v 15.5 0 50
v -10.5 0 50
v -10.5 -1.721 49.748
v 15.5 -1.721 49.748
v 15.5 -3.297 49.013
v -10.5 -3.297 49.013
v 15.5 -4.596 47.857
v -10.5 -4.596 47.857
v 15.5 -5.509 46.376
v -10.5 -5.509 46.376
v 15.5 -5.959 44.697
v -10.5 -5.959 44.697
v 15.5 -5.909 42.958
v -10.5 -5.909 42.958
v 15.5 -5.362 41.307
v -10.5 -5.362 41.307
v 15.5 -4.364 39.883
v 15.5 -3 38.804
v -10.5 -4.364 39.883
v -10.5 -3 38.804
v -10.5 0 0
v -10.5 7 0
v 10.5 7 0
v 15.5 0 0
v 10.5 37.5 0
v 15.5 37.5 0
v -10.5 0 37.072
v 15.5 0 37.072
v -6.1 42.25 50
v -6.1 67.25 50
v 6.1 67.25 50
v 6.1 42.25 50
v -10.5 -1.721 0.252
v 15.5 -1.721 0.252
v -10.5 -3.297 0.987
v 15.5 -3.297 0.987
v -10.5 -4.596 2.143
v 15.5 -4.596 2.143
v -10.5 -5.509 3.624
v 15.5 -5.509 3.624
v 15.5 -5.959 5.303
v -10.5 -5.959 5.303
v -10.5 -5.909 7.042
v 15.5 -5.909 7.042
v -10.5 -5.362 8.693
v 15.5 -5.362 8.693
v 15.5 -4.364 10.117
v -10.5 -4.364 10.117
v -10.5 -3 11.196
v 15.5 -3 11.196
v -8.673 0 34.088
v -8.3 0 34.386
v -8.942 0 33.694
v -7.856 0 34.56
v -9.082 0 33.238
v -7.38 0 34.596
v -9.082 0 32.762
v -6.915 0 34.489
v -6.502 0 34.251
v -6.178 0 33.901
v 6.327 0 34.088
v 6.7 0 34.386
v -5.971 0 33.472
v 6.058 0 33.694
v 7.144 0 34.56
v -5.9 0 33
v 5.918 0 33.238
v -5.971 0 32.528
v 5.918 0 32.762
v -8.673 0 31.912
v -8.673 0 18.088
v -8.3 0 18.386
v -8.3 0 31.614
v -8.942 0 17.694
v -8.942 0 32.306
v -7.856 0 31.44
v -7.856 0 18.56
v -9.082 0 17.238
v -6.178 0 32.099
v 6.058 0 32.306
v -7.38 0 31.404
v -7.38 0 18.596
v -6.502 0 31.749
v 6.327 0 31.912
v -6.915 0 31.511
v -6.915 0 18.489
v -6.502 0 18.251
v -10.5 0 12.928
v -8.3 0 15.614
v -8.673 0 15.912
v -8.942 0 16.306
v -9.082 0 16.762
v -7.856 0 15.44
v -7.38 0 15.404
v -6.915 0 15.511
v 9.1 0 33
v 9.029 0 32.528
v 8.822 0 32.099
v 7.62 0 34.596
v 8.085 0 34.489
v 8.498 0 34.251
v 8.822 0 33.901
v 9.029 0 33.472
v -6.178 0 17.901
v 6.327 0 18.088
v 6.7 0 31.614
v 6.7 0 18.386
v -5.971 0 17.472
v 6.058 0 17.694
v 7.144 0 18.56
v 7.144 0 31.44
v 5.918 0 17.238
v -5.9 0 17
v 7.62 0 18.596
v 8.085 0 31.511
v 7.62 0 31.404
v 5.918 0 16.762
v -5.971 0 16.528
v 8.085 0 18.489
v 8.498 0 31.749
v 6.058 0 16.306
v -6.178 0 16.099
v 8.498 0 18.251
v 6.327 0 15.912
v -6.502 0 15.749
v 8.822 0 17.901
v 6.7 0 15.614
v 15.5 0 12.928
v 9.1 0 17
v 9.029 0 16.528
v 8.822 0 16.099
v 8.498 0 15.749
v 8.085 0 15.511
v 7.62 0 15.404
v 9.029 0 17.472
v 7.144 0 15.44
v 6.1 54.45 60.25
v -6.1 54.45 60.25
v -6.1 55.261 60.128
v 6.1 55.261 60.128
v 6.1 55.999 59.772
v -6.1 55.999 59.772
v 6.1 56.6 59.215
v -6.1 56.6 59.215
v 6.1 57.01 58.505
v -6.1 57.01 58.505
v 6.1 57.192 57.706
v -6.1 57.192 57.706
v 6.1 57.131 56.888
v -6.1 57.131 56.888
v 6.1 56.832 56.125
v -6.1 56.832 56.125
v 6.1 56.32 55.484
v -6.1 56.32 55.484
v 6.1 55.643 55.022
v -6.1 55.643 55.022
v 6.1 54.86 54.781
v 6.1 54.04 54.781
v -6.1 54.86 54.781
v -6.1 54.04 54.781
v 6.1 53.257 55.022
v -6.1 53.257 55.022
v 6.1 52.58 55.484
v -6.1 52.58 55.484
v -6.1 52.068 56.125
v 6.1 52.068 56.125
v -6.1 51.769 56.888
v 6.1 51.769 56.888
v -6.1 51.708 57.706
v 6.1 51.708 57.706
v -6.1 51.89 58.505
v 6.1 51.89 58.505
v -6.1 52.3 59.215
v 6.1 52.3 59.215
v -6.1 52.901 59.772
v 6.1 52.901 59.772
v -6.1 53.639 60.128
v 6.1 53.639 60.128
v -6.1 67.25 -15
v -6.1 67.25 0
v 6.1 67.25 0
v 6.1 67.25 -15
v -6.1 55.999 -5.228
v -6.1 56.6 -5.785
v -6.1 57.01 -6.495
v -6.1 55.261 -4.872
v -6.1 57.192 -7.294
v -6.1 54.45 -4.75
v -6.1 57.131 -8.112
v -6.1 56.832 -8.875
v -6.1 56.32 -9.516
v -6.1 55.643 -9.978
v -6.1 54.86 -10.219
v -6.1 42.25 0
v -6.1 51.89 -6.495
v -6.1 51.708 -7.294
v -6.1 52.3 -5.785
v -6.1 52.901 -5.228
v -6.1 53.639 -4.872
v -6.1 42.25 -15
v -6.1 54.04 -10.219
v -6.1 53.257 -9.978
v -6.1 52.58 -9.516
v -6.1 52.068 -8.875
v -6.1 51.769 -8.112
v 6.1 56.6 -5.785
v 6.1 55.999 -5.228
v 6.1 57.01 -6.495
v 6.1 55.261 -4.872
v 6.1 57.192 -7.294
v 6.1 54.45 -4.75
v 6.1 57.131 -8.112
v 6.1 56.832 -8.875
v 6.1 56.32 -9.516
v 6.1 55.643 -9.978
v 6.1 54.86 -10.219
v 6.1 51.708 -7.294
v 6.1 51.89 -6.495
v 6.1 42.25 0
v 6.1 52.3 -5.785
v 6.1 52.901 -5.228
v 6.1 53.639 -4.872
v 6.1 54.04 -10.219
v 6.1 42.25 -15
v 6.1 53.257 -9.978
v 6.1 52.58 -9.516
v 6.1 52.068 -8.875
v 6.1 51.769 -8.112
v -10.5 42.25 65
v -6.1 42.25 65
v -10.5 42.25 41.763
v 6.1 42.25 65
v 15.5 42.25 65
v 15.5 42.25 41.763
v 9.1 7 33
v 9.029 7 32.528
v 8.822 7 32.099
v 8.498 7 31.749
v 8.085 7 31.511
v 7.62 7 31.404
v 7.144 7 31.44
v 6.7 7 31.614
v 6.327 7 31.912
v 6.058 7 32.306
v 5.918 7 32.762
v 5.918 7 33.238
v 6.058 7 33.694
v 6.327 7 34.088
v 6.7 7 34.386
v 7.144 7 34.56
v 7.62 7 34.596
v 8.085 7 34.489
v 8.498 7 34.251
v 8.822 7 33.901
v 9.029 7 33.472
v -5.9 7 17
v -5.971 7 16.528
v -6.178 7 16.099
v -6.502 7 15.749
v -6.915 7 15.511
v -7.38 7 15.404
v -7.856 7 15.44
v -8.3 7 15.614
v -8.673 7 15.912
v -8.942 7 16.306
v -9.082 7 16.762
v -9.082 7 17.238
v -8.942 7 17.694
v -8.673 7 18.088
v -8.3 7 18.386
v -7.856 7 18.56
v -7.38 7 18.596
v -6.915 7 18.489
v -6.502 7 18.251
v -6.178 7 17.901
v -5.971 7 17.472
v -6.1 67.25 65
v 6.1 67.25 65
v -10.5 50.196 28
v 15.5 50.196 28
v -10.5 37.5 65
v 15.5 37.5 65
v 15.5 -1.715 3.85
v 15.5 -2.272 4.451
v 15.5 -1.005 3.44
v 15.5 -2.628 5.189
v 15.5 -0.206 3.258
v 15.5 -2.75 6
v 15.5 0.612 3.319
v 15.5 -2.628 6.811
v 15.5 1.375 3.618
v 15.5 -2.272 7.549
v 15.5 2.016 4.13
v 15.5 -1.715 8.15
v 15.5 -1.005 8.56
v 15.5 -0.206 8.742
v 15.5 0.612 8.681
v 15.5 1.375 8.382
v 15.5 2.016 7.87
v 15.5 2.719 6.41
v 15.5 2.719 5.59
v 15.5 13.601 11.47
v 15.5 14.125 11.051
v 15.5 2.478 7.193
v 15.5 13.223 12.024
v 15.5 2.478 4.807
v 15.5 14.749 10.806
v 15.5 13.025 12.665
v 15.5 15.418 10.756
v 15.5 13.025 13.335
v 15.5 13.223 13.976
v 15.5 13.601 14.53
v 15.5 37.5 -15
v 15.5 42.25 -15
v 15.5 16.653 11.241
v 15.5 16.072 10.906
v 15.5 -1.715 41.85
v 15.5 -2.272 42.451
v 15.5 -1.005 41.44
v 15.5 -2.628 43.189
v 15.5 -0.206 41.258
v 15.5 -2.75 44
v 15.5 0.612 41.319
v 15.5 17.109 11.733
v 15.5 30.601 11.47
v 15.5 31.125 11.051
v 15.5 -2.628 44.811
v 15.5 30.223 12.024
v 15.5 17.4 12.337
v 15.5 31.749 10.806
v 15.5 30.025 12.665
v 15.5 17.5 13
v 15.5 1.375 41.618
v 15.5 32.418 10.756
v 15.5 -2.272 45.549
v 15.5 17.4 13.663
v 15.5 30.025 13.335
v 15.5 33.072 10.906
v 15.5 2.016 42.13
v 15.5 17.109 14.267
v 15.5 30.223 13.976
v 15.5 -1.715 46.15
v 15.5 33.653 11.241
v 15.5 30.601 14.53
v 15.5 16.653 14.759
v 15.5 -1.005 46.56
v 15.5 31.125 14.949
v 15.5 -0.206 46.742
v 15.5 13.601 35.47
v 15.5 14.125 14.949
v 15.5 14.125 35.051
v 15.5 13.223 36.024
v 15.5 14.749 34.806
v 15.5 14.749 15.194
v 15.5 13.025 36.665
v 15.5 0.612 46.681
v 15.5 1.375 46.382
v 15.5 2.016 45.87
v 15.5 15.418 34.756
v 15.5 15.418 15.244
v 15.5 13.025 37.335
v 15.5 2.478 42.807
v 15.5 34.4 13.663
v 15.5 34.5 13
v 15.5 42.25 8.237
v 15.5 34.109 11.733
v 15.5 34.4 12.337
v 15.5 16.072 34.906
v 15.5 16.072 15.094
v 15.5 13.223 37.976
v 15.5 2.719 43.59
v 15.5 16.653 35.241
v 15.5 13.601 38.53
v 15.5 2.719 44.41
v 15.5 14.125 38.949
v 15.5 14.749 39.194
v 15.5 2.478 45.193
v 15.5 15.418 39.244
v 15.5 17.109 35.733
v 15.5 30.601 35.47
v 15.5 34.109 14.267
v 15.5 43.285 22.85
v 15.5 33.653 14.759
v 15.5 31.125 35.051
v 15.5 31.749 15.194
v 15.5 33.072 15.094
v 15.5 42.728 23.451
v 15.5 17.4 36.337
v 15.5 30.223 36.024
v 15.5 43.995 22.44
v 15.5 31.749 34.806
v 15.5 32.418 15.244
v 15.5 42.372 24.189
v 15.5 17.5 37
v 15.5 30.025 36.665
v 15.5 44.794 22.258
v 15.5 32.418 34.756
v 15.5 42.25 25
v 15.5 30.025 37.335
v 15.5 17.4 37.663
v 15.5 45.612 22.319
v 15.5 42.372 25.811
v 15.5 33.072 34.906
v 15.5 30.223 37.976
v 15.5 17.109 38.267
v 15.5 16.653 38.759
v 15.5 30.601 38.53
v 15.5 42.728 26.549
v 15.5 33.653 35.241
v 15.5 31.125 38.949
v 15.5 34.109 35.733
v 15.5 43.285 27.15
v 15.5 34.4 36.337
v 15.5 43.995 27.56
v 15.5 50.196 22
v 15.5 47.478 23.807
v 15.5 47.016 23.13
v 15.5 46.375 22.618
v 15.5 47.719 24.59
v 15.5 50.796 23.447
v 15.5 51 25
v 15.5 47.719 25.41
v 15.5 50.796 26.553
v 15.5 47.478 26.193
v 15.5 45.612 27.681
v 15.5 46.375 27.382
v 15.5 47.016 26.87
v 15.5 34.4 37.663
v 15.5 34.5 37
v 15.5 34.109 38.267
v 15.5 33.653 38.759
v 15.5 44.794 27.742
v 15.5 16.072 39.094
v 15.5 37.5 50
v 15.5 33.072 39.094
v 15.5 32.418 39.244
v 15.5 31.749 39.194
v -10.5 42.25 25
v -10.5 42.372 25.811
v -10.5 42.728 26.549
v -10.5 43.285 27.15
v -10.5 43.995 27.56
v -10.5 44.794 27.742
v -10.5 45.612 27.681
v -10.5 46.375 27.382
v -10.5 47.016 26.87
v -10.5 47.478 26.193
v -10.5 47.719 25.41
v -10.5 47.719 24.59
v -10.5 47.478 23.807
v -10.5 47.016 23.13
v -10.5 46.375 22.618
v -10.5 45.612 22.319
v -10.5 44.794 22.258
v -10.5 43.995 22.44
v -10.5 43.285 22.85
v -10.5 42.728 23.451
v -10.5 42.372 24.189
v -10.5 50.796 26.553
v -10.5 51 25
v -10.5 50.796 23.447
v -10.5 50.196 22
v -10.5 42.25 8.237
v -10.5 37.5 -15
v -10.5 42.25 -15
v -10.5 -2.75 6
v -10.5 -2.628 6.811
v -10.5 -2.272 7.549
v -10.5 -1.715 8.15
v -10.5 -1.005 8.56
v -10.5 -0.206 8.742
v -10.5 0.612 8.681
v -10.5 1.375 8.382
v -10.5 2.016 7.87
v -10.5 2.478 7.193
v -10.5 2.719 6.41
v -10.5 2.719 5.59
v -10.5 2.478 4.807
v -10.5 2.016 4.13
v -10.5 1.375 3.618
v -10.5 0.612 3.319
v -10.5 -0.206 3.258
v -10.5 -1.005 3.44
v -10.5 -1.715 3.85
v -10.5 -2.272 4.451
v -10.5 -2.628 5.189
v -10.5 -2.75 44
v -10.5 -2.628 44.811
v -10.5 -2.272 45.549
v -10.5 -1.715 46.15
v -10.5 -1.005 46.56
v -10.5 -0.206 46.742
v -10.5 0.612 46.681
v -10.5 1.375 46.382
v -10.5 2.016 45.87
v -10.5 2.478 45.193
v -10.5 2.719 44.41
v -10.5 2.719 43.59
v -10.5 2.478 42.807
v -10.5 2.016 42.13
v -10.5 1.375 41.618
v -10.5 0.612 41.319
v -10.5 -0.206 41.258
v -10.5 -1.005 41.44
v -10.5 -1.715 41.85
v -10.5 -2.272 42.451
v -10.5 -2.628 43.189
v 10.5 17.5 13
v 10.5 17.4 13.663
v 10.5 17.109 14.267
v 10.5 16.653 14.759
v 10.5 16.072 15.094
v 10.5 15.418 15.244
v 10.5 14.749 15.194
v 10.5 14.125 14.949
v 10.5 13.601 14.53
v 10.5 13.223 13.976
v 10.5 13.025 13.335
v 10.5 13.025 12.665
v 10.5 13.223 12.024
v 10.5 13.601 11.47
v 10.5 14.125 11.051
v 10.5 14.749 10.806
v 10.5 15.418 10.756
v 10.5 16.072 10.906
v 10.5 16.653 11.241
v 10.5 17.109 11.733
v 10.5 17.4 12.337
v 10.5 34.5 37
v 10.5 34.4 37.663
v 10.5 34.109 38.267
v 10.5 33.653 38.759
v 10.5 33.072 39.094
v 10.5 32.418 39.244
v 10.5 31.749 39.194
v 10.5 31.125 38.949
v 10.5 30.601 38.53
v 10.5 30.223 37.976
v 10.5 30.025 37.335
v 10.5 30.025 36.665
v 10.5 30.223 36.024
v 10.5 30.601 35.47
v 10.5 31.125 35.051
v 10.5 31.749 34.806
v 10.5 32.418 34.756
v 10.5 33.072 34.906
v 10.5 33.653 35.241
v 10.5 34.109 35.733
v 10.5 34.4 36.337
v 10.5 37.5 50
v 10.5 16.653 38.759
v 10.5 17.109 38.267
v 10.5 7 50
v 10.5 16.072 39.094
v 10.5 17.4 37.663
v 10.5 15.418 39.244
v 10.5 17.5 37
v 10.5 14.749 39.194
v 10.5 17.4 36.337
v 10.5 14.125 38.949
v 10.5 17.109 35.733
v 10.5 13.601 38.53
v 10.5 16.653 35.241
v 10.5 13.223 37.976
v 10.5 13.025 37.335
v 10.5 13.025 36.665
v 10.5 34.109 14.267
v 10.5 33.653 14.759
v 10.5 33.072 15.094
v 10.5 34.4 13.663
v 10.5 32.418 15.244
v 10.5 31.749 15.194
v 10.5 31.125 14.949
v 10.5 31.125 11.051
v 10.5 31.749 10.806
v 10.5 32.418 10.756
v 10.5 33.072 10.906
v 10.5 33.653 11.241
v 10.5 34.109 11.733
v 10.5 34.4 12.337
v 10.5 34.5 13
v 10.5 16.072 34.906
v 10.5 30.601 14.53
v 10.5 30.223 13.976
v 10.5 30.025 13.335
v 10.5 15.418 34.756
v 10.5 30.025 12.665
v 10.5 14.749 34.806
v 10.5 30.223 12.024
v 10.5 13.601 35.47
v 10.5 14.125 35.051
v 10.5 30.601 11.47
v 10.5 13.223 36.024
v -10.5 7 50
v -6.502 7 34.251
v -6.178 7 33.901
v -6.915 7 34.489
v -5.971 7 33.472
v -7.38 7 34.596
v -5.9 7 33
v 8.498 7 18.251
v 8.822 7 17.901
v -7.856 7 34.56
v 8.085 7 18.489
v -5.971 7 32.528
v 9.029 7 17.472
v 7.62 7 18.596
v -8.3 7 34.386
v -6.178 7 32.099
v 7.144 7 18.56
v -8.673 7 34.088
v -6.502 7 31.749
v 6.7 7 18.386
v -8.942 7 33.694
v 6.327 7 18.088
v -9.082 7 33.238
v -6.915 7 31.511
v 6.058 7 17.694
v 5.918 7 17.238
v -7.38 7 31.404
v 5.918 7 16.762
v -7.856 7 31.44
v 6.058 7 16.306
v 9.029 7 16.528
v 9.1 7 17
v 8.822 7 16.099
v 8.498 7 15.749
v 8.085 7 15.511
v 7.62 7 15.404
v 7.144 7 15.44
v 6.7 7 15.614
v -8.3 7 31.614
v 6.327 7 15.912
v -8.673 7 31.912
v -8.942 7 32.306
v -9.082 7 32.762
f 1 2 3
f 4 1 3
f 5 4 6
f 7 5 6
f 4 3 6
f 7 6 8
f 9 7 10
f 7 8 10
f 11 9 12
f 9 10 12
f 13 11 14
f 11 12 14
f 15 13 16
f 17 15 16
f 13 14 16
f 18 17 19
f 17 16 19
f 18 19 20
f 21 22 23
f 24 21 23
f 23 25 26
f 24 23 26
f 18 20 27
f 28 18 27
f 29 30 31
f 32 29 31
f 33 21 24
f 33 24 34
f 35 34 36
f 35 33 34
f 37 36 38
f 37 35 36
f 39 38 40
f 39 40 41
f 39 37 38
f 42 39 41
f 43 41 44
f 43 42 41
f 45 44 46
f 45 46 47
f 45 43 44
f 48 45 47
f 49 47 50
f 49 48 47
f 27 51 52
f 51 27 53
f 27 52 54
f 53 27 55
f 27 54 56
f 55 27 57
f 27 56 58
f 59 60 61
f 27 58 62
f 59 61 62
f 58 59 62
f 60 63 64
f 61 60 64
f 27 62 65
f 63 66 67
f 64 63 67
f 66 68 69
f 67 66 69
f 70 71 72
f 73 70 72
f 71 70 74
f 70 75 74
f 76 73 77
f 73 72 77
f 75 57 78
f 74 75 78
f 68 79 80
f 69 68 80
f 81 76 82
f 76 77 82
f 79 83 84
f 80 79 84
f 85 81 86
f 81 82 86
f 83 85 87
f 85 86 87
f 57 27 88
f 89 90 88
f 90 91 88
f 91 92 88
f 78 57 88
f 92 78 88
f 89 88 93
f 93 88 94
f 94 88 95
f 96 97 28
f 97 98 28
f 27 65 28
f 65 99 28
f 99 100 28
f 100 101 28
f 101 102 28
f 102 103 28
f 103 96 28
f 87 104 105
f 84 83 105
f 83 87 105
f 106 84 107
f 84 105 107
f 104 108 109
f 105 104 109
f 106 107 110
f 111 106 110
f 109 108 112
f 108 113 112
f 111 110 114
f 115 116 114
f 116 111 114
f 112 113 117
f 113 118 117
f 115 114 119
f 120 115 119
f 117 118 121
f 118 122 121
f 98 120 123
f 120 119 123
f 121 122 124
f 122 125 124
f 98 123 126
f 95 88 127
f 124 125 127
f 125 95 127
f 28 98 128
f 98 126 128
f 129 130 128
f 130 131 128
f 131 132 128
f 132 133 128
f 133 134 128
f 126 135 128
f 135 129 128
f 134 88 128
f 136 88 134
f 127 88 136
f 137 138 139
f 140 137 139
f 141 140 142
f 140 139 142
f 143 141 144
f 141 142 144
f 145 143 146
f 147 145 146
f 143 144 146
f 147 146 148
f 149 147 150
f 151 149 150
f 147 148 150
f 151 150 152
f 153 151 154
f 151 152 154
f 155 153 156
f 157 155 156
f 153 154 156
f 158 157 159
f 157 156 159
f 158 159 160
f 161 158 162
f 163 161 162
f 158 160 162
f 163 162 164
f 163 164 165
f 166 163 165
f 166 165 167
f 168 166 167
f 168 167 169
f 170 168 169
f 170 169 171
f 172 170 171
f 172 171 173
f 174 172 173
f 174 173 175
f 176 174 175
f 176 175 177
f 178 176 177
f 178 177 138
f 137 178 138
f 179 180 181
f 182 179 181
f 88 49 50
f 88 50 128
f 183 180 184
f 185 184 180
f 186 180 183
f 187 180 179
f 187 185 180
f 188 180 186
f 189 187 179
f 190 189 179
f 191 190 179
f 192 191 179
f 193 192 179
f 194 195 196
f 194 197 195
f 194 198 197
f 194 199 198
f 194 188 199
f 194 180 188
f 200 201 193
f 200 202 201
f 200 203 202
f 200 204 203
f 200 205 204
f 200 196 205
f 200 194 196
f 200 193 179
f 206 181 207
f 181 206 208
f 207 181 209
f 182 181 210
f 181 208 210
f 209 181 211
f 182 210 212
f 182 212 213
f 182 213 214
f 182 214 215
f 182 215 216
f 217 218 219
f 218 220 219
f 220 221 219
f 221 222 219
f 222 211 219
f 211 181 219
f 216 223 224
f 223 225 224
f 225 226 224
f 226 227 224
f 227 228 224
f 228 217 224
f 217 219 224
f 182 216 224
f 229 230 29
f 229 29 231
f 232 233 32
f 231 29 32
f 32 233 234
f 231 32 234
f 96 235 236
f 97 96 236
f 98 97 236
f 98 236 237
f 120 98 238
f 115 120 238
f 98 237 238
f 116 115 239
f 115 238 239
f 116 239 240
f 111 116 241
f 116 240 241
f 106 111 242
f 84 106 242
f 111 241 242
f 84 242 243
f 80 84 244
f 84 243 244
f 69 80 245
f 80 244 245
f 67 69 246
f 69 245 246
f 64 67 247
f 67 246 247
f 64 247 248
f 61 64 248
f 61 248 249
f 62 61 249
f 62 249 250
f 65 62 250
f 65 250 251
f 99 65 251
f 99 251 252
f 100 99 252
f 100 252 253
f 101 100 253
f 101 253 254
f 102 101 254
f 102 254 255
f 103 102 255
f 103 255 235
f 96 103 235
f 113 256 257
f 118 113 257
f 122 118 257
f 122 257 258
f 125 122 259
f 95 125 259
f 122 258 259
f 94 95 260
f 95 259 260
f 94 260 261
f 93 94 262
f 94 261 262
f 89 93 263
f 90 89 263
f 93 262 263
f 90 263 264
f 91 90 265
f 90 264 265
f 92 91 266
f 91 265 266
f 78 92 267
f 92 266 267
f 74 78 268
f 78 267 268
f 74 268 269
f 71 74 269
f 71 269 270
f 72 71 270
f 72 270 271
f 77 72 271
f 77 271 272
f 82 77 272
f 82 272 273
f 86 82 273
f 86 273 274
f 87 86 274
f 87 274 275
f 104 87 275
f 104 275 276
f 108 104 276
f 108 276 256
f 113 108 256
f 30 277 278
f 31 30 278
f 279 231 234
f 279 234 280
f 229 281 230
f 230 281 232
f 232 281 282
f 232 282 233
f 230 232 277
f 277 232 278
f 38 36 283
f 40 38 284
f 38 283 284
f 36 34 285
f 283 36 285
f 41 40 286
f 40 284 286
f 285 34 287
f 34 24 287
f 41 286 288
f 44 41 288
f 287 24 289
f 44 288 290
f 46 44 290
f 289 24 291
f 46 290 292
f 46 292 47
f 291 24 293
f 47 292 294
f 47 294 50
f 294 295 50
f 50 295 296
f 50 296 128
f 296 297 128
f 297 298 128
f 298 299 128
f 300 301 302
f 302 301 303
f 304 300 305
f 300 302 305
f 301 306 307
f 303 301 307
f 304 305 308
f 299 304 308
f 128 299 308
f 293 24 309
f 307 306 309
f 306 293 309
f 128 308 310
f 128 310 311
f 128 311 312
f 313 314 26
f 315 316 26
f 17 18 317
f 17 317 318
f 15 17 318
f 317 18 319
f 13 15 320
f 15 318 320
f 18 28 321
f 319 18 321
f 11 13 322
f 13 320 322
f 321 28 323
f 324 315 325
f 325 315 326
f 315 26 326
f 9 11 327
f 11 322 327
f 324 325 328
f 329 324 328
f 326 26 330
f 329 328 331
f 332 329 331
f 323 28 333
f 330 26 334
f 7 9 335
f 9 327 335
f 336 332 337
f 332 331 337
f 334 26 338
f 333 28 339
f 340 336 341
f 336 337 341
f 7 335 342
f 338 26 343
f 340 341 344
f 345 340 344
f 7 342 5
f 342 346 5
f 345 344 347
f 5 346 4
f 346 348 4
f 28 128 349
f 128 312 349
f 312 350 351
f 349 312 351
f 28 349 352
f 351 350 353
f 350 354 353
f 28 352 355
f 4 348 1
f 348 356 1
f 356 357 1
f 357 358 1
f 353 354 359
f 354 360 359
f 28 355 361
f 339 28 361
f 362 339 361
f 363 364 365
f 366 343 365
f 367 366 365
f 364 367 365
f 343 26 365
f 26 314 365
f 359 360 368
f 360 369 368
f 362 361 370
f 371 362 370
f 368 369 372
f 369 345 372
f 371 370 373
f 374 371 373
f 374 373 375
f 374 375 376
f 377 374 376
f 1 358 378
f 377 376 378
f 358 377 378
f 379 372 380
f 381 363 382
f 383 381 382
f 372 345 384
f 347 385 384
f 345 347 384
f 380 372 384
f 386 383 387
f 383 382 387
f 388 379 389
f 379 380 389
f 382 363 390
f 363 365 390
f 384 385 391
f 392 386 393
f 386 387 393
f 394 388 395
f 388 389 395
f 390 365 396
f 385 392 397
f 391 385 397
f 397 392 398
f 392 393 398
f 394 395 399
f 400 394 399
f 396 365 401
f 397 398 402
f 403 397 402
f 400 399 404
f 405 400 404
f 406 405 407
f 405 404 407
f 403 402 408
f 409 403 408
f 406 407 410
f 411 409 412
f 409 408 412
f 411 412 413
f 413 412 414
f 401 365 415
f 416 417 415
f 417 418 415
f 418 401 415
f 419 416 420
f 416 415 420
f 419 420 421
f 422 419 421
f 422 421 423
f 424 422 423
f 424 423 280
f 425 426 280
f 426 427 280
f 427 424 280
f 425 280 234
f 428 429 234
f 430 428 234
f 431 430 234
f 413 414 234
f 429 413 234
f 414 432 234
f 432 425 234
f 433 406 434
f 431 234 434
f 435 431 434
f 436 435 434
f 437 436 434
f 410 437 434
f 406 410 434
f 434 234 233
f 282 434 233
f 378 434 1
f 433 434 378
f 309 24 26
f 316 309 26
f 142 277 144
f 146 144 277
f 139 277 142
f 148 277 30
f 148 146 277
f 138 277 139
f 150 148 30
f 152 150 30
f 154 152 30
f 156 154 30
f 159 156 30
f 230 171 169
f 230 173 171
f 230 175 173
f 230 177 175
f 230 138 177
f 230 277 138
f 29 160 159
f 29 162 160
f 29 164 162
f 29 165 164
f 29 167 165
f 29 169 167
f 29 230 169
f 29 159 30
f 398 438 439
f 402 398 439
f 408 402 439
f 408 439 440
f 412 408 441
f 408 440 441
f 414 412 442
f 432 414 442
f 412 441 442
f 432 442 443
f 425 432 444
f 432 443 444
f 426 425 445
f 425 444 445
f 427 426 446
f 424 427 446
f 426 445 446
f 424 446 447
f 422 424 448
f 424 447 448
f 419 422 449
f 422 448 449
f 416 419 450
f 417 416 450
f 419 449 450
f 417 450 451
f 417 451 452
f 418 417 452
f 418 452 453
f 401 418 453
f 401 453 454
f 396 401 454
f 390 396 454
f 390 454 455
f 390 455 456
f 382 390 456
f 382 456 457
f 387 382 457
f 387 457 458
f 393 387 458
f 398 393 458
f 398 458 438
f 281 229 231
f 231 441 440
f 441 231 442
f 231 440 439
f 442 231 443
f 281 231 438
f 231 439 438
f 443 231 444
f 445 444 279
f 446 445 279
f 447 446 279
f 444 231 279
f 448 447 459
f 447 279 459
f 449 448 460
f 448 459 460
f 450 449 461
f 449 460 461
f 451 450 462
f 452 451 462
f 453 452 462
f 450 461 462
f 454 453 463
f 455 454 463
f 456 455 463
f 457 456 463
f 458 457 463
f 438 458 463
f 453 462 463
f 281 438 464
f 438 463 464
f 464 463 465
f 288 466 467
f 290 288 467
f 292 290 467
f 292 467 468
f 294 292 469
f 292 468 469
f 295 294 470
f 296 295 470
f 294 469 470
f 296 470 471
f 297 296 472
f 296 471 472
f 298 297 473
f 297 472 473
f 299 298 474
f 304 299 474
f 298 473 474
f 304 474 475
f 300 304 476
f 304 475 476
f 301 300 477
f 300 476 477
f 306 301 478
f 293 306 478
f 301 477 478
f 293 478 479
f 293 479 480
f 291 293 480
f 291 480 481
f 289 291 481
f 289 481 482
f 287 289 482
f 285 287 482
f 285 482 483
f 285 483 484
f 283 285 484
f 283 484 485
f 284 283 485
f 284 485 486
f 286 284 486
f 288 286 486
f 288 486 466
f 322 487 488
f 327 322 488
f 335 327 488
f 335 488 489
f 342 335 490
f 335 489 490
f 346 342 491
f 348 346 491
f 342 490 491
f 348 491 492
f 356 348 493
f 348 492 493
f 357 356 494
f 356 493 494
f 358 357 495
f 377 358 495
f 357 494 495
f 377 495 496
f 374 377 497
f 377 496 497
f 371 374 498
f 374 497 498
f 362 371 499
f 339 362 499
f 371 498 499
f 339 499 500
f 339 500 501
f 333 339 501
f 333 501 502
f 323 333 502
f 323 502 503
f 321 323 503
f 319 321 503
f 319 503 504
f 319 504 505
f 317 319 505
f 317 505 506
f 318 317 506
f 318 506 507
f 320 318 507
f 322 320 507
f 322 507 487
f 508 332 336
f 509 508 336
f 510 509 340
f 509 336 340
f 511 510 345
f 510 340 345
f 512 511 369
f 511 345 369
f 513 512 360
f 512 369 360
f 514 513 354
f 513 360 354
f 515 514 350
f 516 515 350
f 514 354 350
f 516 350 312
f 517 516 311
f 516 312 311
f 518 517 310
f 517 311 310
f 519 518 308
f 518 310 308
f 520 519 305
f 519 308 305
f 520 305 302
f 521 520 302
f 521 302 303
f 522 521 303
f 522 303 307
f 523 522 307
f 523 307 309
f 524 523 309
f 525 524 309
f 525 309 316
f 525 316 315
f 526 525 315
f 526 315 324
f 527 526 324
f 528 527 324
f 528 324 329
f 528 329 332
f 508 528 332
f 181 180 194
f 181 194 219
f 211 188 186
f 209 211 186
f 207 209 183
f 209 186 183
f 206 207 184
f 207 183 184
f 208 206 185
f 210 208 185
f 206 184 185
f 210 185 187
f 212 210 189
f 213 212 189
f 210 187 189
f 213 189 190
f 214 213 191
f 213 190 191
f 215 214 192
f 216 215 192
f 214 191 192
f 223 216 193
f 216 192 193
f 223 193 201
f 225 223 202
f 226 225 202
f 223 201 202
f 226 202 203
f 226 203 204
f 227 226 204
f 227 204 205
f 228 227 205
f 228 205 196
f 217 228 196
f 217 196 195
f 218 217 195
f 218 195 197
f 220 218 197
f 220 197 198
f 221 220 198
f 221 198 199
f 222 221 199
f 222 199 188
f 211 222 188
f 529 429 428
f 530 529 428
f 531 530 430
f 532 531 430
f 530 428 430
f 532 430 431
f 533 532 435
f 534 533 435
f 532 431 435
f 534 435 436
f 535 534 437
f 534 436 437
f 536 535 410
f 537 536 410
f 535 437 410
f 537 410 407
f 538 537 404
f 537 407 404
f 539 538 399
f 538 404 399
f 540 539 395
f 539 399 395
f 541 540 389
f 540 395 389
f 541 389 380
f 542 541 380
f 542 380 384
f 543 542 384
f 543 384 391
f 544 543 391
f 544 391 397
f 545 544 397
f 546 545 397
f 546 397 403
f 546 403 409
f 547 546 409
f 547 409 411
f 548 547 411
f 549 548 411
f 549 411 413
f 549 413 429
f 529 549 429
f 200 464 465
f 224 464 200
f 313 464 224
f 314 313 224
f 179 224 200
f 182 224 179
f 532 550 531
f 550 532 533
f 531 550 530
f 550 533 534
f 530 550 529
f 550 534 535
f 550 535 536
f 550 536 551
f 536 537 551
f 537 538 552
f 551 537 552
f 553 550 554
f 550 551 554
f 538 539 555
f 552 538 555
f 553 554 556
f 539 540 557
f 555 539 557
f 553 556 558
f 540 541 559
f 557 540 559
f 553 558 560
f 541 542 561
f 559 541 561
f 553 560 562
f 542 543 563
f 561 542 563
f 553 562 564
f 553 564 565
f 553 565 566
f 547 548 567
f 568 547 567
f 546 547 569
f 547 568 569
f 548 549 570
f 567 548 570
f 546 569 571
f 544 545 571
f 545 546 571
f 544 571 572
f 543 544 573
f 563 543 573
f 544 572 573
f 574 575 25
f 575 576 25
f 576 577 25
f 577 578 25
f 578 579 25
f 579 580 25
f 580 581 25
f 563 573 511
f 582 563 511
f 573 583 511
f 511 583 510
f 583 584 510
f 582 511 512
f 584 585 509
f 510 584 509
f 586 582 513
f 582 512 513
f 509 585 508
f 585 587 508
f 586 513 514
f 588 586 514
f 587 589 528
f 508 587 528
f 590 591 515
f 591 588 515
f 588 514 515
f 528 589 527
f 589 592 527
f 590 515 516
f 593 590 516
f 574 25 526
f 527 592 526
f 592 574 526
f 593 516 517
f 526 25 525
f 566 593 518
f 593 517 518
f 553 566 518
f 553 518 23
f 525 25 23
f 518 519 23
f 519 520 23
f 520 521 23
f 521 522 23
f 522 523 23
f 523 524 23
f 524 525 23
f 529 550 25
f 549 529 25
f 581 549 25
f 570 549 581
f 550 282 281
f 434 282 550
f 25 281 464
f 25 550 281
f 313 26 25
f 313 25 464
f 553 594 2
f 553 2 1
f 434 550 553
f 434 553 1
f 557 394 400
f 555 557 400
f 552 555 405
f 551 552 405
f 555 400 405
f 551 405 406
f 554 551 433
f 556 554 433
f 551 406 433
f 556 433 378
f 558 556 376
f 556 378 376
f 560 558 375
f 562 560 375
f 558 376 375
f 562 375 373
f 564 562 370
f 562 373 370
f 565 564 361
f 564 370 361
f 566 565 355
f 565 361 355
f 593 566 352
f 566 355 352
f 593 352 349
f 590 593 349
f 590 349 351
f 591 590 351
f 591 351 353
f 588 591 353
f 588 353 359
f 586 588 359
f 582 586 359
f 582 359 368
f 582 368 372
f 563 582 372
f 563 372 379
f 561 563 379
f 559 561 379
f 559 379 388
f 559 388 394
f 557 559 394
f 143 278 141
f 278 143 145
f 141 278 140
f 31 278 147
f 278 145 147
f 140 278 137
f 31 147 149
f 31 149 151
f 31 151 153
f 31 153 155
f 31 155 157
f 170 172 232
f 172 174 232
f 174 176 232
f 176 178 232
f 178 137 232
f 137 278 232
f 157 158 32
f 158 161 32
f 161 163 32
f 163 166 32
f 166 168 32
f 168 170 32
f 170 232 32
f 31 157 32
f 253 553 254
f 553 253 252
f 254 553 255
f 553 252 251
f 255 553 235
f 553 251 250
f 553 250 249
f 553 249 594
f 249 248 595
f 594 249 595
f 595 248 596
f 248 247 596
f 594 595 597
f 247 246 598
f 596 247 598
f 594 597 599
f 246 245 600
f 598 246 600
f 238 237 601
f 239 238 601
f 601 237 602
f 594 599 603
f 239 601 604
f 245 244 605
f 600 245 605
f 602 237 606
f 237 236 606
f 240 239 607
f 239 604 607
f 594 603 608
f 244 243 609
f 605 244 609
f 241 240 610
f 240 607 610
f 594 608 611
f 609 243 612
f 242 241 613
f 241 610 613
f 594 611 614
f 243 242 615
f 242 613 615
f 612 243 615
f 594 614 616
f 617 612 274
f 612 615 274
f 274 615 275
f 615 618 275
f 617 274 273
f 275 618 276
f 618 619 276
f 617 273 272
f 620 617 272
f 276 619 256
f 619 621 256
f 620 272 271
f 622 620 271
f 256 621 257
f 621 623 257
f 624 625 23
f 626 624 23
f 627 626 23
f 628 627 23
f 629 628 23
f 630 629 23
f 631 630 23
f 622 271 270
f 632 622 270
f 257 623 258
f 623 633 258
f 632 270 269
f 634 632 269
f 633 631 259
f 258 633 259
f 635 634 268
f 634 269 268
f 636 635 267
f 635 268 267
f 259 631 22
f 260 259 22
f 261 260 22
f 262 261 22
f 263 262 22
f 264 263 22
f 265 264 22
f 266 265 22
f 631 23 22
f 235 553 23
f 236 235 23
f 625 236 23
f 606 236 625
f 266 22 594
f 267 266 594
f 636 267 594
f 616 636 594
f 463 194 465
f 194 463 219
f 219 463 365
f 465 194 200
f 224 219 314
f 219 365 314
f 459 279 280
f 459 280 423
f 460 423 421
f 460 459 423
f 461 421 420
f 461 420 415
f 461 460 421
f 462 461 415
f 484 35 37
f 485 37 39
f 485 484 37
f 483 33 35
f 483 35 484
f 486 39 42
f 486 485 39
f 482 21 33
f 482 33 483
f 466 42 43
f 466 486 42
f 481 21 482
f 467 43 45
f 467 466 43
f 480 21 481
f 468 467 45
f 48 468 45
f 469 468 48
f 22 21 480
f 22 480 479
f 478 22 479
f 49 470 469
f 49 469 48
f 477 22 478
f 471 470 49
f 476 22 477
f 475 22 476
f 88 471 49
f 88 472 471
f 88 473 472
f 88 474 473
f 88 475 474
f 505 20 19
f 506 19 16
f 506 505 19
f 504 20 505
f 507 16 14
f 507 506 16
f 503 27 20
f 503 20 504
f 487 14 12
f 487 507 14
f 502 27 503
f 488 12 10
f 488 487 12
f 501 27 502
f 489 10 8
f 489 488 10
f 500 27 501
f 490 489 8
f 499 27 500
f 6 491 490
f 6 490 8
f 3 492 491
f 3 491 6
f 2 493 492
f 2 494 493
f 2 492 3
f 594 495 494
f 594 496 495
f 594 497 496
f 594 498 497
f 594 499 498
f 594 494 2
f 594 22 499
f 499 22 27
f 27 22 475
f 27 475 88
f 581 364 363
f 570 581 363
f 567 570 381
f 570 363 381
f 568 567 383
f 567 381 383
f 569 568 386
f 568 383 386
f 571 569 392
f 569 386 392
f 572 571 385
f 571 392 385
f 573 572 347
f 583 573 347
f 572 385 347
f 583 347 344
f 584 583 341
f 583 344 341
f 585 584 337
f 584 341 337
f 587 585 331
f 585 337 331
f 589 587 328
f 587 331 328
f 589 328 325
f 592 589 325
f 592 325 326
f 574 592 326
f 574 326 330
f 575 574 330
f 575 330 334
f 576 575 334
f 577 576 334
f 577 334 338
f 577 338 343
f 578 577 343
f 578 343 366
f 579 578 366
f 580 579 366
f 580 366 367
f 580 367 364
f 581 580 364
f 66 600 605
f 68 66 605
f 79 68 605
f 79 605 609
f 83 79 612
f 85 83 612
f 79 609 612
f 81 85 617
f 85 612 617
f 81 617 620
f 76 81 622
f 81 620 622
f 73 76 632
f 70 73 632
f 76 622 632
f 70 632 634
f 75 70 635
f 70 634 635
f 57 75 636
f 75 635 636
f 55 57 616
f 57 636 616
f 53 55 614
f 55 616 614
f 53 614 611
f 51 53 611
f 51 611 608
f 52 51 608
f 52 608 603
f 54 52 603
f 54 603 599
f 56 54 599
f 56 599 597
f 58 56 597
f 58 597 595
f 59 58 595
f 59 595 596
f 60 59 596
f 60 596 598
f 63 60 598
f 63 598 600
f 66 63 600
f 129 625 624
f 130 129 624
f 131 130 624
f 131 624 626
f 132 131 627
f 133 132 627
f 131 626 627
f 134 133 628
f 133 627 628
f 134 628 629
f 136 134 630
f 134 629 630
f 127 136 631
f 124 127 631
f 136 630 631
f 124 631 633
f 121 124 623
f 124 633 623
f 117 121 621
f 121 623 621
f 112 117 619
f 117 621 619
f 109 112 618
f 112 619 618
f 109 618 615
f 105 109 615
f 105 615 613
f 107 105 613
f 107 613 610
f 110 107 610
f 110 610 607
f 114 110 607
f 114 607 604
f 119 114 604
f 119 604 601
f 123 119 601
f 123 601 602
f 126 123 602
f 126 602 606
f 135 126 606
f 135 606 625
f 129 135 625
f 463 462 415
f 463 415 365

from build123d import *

# Parameters (mm, degrees)
BOSS_EXTRUDE1_DEPTH            = 50
F_3_2_3_2_DIAMETER_HOLE1_D     = 3.2
F_3_2_3_2_DIAMETER_HOLE1_DEPTH = 7
SKETCH5_R                      = 2.25
CUT_EXTRUDE1_DEPTH             = 71.434810286
SKETCH6_W                      = 15
SKETCH6_H                      = 4.75
BOSS_EXTRUDE2_DEPTH            = 26
SKETCH8_W                      = 12.2
SKETCH8_H                      = 15
BOSS_EXTRUDE3_DEPTH            = 25
SKETCH9_R                      = 2.75
CUT_EXTRUDE2_DEPTH             = 96.990220856
BOSS_EXTRUDE4_DEPTH            = 26
CUT_EXTRUDE3_REACH             = 99.075
SKETCH11_R                     = 2.75


with BuildPart() as part:
    # Sketch1 → Boss-Extrude1 (new body)
    with BuildSketch(Plane.XY):
        Polygon((-10.5, 0), (15.5, 0), (15.5, 42.25), (-10.5, 42.25), (-10.5, 37.5), (10.5, 37.5), (10.5, 7), (-10.5, 7), align=None)
    extrude(amount=BOSS_EXTRUDE1_DEPTH)

    # Ø3.2 (3.2) Diameter Hole1
    with Locations(Plane(origin=(0, 0, 0), x_dir=(-1, 0, 0), z_dir=(0, -1, 0))):
        with Locations((-7.5, -17), (7.5, -17), (7.5, -33), (-7.5, -33)):
            Hole(F_3_2_3_2_DIAMETER_HOLE1_D / 2, depth=F_3_2_3_2_DIAMETER_HOLE1_DEPTH)

    # Sketch5 → Cut-Extrude1 (cut, through all)
    with BuildSketch(Plane(origin=(15.5, 0, 0), x_dir=(0, 0, -1), z_dir=(1, 0, 0))):
        with Locations(Location((-37, 32.25, 0), (0, 0, 90))):
            Circle(SKETCH5_R)
        with Locations(Location((-13, 32.25, 0), (0, 0, 90))):
            Circle(SKETCH5_R)
        with Locations(Location((-37, 15.25, 0), (0, 0, 90))):
            Circle(SKETCH5_R)
        with Locations(Location((-13, 15.25, 0), (0, 0, 90))):
            Circle(SKETCH5_R)
    extrude(amount=-CUT_EXTRUDE1_DEPTH, mode=Mode.SUBTRACT)

    # Sketch6 → Boss-Extrude2 (add)
    with BuildSketch(Plane(origin=(15.5, 0, 0), x_dir=(0, 0, -1), z_dir=(1, 0, 0))):
        with Locations((-57.5, 39.875)):
            Rectangle(SKETCH6_W, SKETCH6_H)
        with Locations((7.5, 39.875)):
            Rectangle(SKETCH6_W, SKETCH6_H)
    extrude(amount=-BOSS_EXTRUDE2_DEPTH)

    # Sketch8 → Boss-Extrude3 (add)
    with BuildSketch(Plane(origin=(0, 42.25, 0), x_dir=(1, 0, 0), z_dir=(0, 1, 0))):
        with Locations((0, 7.5)):
            Rectangle(SKETCH8_W, SKETCH8_H)
        with Locations((0, -57.5)):
            Rectangle(SKETCH8_W, SKETCH8_H)
    extrude(amount=BOSS_EXTRUDE3_DEPTH)

    # Sketch9 → Cut-Extrude2 (cut, through all)
    with BuildSketch(Plane.ZY.offset(6.1)):
        with Locations((-7.5, 54.45)):
            Circle(SKETCH9_R)
        with Locations((57.5, 54.45)):
            Circle(SKETCH9_R)
    extrude(amount=-CUT_EXTRUDE2_DEPTH, mode=Mode.SUBTRACT)

    # Sketch10 → Boss-Extrude4 (add)
    with BuildSketch(Plane.ZY.offset(10.5)):
        with BuildLine():
            Line((11.196152423, -3), (12.92820323, 0))
            Line((12.92820323, 0), (0, 0))
            ThreePointArc((0, 0), (4.447085729, -5.795554958), (11.196152423, -3))
        make_face()
        with BuildLine():
            Line((22, 50.196152423), (8.236860279, 42.25))
            Line((8.236860279, 42.25), (41.763139721, 42.25))
            Line((41.763139721, 42.25), (28, 50.196152423))
            ThreePointArc((28, 50.196152423), (25, 51), (22, 50.196152423))
        make_face()
        with BuildLine():
            Line((38.803847577, -3), (37.07179677, 0))
            Line((37.07179677, 0), (50, 0))
            ThreePointArc((50, 0), (45.552914271, -5.795554958), (38.803847577, -3))
        make_face()
    extrude(amount=-BOSS_EXTRUDE4_DEPTH)

    # Sketch11 → Cut-Extrude3 (cut, up to next)
    with BuildSketch(Plane.ZY.offset(10.5), mode=Mode.PRIVATE) as cut_extrude3_sk1:
        with Locations(Location((25, 45, 0), (0, 0, 270))):
            Circle(SKETCH11_R)
    cut_extrude3_tool1 = extrude(cut_extrude3_sk1.sketch, amount=-CUT_EXTRUDE3_REACH, mode=Mode.PRIVATE) & part.part
    # Sketch11 → Cut-Extrude3 (cut, up to next)
    with BuildSketch(Plane.ZY.offset(10.5), mode=Mode.PRIVATE) as cut_extrude3_sk2:
        with Locations(Location((44, 0, 0), (0, 0, 270))):
            Circle(SKETCH11_R)
    cut_extrude3_tool2 = extrude(cut_extrude3_sk2.sketch, amount=-CUT_EXTRUDE3_REACH, mode=Mode.PRIVATE) & part.part
    # Sketch11 → Cut-Extrude3 (cut, up to next)
    with BuildSketch(Plane.ZY.offset(10.5), mode=Mode.PRIVATE) as cut_extrude3_sk3:
        with Locations(Location((6, 0, 0), (0, 0, 270))):
            Circle(SKETCH11_R)
    cut_extrude3_tool3 = extrude(cut_extrude3_sk3.sketch, amount=-CUT_EXTRUDE3_REACH, mode=Mode.PRIVATE) & part.part
    add(cut_extrude3_tool1.solids().sort_by_distance((-10.5, 45, 25))[0], mode=Mode.SUBTRACT)
    add(cut_extrude3_tool2.solids().sort_by_distance((-10.5, 0, 44))[0], mode=Mode.SUBTRACT)
    add(cut_extrude3_tool3.solids().sort_by_distance((-10.5, 0, 6))[0], mode=Mode.SUBTRACT)


solid = part.part
